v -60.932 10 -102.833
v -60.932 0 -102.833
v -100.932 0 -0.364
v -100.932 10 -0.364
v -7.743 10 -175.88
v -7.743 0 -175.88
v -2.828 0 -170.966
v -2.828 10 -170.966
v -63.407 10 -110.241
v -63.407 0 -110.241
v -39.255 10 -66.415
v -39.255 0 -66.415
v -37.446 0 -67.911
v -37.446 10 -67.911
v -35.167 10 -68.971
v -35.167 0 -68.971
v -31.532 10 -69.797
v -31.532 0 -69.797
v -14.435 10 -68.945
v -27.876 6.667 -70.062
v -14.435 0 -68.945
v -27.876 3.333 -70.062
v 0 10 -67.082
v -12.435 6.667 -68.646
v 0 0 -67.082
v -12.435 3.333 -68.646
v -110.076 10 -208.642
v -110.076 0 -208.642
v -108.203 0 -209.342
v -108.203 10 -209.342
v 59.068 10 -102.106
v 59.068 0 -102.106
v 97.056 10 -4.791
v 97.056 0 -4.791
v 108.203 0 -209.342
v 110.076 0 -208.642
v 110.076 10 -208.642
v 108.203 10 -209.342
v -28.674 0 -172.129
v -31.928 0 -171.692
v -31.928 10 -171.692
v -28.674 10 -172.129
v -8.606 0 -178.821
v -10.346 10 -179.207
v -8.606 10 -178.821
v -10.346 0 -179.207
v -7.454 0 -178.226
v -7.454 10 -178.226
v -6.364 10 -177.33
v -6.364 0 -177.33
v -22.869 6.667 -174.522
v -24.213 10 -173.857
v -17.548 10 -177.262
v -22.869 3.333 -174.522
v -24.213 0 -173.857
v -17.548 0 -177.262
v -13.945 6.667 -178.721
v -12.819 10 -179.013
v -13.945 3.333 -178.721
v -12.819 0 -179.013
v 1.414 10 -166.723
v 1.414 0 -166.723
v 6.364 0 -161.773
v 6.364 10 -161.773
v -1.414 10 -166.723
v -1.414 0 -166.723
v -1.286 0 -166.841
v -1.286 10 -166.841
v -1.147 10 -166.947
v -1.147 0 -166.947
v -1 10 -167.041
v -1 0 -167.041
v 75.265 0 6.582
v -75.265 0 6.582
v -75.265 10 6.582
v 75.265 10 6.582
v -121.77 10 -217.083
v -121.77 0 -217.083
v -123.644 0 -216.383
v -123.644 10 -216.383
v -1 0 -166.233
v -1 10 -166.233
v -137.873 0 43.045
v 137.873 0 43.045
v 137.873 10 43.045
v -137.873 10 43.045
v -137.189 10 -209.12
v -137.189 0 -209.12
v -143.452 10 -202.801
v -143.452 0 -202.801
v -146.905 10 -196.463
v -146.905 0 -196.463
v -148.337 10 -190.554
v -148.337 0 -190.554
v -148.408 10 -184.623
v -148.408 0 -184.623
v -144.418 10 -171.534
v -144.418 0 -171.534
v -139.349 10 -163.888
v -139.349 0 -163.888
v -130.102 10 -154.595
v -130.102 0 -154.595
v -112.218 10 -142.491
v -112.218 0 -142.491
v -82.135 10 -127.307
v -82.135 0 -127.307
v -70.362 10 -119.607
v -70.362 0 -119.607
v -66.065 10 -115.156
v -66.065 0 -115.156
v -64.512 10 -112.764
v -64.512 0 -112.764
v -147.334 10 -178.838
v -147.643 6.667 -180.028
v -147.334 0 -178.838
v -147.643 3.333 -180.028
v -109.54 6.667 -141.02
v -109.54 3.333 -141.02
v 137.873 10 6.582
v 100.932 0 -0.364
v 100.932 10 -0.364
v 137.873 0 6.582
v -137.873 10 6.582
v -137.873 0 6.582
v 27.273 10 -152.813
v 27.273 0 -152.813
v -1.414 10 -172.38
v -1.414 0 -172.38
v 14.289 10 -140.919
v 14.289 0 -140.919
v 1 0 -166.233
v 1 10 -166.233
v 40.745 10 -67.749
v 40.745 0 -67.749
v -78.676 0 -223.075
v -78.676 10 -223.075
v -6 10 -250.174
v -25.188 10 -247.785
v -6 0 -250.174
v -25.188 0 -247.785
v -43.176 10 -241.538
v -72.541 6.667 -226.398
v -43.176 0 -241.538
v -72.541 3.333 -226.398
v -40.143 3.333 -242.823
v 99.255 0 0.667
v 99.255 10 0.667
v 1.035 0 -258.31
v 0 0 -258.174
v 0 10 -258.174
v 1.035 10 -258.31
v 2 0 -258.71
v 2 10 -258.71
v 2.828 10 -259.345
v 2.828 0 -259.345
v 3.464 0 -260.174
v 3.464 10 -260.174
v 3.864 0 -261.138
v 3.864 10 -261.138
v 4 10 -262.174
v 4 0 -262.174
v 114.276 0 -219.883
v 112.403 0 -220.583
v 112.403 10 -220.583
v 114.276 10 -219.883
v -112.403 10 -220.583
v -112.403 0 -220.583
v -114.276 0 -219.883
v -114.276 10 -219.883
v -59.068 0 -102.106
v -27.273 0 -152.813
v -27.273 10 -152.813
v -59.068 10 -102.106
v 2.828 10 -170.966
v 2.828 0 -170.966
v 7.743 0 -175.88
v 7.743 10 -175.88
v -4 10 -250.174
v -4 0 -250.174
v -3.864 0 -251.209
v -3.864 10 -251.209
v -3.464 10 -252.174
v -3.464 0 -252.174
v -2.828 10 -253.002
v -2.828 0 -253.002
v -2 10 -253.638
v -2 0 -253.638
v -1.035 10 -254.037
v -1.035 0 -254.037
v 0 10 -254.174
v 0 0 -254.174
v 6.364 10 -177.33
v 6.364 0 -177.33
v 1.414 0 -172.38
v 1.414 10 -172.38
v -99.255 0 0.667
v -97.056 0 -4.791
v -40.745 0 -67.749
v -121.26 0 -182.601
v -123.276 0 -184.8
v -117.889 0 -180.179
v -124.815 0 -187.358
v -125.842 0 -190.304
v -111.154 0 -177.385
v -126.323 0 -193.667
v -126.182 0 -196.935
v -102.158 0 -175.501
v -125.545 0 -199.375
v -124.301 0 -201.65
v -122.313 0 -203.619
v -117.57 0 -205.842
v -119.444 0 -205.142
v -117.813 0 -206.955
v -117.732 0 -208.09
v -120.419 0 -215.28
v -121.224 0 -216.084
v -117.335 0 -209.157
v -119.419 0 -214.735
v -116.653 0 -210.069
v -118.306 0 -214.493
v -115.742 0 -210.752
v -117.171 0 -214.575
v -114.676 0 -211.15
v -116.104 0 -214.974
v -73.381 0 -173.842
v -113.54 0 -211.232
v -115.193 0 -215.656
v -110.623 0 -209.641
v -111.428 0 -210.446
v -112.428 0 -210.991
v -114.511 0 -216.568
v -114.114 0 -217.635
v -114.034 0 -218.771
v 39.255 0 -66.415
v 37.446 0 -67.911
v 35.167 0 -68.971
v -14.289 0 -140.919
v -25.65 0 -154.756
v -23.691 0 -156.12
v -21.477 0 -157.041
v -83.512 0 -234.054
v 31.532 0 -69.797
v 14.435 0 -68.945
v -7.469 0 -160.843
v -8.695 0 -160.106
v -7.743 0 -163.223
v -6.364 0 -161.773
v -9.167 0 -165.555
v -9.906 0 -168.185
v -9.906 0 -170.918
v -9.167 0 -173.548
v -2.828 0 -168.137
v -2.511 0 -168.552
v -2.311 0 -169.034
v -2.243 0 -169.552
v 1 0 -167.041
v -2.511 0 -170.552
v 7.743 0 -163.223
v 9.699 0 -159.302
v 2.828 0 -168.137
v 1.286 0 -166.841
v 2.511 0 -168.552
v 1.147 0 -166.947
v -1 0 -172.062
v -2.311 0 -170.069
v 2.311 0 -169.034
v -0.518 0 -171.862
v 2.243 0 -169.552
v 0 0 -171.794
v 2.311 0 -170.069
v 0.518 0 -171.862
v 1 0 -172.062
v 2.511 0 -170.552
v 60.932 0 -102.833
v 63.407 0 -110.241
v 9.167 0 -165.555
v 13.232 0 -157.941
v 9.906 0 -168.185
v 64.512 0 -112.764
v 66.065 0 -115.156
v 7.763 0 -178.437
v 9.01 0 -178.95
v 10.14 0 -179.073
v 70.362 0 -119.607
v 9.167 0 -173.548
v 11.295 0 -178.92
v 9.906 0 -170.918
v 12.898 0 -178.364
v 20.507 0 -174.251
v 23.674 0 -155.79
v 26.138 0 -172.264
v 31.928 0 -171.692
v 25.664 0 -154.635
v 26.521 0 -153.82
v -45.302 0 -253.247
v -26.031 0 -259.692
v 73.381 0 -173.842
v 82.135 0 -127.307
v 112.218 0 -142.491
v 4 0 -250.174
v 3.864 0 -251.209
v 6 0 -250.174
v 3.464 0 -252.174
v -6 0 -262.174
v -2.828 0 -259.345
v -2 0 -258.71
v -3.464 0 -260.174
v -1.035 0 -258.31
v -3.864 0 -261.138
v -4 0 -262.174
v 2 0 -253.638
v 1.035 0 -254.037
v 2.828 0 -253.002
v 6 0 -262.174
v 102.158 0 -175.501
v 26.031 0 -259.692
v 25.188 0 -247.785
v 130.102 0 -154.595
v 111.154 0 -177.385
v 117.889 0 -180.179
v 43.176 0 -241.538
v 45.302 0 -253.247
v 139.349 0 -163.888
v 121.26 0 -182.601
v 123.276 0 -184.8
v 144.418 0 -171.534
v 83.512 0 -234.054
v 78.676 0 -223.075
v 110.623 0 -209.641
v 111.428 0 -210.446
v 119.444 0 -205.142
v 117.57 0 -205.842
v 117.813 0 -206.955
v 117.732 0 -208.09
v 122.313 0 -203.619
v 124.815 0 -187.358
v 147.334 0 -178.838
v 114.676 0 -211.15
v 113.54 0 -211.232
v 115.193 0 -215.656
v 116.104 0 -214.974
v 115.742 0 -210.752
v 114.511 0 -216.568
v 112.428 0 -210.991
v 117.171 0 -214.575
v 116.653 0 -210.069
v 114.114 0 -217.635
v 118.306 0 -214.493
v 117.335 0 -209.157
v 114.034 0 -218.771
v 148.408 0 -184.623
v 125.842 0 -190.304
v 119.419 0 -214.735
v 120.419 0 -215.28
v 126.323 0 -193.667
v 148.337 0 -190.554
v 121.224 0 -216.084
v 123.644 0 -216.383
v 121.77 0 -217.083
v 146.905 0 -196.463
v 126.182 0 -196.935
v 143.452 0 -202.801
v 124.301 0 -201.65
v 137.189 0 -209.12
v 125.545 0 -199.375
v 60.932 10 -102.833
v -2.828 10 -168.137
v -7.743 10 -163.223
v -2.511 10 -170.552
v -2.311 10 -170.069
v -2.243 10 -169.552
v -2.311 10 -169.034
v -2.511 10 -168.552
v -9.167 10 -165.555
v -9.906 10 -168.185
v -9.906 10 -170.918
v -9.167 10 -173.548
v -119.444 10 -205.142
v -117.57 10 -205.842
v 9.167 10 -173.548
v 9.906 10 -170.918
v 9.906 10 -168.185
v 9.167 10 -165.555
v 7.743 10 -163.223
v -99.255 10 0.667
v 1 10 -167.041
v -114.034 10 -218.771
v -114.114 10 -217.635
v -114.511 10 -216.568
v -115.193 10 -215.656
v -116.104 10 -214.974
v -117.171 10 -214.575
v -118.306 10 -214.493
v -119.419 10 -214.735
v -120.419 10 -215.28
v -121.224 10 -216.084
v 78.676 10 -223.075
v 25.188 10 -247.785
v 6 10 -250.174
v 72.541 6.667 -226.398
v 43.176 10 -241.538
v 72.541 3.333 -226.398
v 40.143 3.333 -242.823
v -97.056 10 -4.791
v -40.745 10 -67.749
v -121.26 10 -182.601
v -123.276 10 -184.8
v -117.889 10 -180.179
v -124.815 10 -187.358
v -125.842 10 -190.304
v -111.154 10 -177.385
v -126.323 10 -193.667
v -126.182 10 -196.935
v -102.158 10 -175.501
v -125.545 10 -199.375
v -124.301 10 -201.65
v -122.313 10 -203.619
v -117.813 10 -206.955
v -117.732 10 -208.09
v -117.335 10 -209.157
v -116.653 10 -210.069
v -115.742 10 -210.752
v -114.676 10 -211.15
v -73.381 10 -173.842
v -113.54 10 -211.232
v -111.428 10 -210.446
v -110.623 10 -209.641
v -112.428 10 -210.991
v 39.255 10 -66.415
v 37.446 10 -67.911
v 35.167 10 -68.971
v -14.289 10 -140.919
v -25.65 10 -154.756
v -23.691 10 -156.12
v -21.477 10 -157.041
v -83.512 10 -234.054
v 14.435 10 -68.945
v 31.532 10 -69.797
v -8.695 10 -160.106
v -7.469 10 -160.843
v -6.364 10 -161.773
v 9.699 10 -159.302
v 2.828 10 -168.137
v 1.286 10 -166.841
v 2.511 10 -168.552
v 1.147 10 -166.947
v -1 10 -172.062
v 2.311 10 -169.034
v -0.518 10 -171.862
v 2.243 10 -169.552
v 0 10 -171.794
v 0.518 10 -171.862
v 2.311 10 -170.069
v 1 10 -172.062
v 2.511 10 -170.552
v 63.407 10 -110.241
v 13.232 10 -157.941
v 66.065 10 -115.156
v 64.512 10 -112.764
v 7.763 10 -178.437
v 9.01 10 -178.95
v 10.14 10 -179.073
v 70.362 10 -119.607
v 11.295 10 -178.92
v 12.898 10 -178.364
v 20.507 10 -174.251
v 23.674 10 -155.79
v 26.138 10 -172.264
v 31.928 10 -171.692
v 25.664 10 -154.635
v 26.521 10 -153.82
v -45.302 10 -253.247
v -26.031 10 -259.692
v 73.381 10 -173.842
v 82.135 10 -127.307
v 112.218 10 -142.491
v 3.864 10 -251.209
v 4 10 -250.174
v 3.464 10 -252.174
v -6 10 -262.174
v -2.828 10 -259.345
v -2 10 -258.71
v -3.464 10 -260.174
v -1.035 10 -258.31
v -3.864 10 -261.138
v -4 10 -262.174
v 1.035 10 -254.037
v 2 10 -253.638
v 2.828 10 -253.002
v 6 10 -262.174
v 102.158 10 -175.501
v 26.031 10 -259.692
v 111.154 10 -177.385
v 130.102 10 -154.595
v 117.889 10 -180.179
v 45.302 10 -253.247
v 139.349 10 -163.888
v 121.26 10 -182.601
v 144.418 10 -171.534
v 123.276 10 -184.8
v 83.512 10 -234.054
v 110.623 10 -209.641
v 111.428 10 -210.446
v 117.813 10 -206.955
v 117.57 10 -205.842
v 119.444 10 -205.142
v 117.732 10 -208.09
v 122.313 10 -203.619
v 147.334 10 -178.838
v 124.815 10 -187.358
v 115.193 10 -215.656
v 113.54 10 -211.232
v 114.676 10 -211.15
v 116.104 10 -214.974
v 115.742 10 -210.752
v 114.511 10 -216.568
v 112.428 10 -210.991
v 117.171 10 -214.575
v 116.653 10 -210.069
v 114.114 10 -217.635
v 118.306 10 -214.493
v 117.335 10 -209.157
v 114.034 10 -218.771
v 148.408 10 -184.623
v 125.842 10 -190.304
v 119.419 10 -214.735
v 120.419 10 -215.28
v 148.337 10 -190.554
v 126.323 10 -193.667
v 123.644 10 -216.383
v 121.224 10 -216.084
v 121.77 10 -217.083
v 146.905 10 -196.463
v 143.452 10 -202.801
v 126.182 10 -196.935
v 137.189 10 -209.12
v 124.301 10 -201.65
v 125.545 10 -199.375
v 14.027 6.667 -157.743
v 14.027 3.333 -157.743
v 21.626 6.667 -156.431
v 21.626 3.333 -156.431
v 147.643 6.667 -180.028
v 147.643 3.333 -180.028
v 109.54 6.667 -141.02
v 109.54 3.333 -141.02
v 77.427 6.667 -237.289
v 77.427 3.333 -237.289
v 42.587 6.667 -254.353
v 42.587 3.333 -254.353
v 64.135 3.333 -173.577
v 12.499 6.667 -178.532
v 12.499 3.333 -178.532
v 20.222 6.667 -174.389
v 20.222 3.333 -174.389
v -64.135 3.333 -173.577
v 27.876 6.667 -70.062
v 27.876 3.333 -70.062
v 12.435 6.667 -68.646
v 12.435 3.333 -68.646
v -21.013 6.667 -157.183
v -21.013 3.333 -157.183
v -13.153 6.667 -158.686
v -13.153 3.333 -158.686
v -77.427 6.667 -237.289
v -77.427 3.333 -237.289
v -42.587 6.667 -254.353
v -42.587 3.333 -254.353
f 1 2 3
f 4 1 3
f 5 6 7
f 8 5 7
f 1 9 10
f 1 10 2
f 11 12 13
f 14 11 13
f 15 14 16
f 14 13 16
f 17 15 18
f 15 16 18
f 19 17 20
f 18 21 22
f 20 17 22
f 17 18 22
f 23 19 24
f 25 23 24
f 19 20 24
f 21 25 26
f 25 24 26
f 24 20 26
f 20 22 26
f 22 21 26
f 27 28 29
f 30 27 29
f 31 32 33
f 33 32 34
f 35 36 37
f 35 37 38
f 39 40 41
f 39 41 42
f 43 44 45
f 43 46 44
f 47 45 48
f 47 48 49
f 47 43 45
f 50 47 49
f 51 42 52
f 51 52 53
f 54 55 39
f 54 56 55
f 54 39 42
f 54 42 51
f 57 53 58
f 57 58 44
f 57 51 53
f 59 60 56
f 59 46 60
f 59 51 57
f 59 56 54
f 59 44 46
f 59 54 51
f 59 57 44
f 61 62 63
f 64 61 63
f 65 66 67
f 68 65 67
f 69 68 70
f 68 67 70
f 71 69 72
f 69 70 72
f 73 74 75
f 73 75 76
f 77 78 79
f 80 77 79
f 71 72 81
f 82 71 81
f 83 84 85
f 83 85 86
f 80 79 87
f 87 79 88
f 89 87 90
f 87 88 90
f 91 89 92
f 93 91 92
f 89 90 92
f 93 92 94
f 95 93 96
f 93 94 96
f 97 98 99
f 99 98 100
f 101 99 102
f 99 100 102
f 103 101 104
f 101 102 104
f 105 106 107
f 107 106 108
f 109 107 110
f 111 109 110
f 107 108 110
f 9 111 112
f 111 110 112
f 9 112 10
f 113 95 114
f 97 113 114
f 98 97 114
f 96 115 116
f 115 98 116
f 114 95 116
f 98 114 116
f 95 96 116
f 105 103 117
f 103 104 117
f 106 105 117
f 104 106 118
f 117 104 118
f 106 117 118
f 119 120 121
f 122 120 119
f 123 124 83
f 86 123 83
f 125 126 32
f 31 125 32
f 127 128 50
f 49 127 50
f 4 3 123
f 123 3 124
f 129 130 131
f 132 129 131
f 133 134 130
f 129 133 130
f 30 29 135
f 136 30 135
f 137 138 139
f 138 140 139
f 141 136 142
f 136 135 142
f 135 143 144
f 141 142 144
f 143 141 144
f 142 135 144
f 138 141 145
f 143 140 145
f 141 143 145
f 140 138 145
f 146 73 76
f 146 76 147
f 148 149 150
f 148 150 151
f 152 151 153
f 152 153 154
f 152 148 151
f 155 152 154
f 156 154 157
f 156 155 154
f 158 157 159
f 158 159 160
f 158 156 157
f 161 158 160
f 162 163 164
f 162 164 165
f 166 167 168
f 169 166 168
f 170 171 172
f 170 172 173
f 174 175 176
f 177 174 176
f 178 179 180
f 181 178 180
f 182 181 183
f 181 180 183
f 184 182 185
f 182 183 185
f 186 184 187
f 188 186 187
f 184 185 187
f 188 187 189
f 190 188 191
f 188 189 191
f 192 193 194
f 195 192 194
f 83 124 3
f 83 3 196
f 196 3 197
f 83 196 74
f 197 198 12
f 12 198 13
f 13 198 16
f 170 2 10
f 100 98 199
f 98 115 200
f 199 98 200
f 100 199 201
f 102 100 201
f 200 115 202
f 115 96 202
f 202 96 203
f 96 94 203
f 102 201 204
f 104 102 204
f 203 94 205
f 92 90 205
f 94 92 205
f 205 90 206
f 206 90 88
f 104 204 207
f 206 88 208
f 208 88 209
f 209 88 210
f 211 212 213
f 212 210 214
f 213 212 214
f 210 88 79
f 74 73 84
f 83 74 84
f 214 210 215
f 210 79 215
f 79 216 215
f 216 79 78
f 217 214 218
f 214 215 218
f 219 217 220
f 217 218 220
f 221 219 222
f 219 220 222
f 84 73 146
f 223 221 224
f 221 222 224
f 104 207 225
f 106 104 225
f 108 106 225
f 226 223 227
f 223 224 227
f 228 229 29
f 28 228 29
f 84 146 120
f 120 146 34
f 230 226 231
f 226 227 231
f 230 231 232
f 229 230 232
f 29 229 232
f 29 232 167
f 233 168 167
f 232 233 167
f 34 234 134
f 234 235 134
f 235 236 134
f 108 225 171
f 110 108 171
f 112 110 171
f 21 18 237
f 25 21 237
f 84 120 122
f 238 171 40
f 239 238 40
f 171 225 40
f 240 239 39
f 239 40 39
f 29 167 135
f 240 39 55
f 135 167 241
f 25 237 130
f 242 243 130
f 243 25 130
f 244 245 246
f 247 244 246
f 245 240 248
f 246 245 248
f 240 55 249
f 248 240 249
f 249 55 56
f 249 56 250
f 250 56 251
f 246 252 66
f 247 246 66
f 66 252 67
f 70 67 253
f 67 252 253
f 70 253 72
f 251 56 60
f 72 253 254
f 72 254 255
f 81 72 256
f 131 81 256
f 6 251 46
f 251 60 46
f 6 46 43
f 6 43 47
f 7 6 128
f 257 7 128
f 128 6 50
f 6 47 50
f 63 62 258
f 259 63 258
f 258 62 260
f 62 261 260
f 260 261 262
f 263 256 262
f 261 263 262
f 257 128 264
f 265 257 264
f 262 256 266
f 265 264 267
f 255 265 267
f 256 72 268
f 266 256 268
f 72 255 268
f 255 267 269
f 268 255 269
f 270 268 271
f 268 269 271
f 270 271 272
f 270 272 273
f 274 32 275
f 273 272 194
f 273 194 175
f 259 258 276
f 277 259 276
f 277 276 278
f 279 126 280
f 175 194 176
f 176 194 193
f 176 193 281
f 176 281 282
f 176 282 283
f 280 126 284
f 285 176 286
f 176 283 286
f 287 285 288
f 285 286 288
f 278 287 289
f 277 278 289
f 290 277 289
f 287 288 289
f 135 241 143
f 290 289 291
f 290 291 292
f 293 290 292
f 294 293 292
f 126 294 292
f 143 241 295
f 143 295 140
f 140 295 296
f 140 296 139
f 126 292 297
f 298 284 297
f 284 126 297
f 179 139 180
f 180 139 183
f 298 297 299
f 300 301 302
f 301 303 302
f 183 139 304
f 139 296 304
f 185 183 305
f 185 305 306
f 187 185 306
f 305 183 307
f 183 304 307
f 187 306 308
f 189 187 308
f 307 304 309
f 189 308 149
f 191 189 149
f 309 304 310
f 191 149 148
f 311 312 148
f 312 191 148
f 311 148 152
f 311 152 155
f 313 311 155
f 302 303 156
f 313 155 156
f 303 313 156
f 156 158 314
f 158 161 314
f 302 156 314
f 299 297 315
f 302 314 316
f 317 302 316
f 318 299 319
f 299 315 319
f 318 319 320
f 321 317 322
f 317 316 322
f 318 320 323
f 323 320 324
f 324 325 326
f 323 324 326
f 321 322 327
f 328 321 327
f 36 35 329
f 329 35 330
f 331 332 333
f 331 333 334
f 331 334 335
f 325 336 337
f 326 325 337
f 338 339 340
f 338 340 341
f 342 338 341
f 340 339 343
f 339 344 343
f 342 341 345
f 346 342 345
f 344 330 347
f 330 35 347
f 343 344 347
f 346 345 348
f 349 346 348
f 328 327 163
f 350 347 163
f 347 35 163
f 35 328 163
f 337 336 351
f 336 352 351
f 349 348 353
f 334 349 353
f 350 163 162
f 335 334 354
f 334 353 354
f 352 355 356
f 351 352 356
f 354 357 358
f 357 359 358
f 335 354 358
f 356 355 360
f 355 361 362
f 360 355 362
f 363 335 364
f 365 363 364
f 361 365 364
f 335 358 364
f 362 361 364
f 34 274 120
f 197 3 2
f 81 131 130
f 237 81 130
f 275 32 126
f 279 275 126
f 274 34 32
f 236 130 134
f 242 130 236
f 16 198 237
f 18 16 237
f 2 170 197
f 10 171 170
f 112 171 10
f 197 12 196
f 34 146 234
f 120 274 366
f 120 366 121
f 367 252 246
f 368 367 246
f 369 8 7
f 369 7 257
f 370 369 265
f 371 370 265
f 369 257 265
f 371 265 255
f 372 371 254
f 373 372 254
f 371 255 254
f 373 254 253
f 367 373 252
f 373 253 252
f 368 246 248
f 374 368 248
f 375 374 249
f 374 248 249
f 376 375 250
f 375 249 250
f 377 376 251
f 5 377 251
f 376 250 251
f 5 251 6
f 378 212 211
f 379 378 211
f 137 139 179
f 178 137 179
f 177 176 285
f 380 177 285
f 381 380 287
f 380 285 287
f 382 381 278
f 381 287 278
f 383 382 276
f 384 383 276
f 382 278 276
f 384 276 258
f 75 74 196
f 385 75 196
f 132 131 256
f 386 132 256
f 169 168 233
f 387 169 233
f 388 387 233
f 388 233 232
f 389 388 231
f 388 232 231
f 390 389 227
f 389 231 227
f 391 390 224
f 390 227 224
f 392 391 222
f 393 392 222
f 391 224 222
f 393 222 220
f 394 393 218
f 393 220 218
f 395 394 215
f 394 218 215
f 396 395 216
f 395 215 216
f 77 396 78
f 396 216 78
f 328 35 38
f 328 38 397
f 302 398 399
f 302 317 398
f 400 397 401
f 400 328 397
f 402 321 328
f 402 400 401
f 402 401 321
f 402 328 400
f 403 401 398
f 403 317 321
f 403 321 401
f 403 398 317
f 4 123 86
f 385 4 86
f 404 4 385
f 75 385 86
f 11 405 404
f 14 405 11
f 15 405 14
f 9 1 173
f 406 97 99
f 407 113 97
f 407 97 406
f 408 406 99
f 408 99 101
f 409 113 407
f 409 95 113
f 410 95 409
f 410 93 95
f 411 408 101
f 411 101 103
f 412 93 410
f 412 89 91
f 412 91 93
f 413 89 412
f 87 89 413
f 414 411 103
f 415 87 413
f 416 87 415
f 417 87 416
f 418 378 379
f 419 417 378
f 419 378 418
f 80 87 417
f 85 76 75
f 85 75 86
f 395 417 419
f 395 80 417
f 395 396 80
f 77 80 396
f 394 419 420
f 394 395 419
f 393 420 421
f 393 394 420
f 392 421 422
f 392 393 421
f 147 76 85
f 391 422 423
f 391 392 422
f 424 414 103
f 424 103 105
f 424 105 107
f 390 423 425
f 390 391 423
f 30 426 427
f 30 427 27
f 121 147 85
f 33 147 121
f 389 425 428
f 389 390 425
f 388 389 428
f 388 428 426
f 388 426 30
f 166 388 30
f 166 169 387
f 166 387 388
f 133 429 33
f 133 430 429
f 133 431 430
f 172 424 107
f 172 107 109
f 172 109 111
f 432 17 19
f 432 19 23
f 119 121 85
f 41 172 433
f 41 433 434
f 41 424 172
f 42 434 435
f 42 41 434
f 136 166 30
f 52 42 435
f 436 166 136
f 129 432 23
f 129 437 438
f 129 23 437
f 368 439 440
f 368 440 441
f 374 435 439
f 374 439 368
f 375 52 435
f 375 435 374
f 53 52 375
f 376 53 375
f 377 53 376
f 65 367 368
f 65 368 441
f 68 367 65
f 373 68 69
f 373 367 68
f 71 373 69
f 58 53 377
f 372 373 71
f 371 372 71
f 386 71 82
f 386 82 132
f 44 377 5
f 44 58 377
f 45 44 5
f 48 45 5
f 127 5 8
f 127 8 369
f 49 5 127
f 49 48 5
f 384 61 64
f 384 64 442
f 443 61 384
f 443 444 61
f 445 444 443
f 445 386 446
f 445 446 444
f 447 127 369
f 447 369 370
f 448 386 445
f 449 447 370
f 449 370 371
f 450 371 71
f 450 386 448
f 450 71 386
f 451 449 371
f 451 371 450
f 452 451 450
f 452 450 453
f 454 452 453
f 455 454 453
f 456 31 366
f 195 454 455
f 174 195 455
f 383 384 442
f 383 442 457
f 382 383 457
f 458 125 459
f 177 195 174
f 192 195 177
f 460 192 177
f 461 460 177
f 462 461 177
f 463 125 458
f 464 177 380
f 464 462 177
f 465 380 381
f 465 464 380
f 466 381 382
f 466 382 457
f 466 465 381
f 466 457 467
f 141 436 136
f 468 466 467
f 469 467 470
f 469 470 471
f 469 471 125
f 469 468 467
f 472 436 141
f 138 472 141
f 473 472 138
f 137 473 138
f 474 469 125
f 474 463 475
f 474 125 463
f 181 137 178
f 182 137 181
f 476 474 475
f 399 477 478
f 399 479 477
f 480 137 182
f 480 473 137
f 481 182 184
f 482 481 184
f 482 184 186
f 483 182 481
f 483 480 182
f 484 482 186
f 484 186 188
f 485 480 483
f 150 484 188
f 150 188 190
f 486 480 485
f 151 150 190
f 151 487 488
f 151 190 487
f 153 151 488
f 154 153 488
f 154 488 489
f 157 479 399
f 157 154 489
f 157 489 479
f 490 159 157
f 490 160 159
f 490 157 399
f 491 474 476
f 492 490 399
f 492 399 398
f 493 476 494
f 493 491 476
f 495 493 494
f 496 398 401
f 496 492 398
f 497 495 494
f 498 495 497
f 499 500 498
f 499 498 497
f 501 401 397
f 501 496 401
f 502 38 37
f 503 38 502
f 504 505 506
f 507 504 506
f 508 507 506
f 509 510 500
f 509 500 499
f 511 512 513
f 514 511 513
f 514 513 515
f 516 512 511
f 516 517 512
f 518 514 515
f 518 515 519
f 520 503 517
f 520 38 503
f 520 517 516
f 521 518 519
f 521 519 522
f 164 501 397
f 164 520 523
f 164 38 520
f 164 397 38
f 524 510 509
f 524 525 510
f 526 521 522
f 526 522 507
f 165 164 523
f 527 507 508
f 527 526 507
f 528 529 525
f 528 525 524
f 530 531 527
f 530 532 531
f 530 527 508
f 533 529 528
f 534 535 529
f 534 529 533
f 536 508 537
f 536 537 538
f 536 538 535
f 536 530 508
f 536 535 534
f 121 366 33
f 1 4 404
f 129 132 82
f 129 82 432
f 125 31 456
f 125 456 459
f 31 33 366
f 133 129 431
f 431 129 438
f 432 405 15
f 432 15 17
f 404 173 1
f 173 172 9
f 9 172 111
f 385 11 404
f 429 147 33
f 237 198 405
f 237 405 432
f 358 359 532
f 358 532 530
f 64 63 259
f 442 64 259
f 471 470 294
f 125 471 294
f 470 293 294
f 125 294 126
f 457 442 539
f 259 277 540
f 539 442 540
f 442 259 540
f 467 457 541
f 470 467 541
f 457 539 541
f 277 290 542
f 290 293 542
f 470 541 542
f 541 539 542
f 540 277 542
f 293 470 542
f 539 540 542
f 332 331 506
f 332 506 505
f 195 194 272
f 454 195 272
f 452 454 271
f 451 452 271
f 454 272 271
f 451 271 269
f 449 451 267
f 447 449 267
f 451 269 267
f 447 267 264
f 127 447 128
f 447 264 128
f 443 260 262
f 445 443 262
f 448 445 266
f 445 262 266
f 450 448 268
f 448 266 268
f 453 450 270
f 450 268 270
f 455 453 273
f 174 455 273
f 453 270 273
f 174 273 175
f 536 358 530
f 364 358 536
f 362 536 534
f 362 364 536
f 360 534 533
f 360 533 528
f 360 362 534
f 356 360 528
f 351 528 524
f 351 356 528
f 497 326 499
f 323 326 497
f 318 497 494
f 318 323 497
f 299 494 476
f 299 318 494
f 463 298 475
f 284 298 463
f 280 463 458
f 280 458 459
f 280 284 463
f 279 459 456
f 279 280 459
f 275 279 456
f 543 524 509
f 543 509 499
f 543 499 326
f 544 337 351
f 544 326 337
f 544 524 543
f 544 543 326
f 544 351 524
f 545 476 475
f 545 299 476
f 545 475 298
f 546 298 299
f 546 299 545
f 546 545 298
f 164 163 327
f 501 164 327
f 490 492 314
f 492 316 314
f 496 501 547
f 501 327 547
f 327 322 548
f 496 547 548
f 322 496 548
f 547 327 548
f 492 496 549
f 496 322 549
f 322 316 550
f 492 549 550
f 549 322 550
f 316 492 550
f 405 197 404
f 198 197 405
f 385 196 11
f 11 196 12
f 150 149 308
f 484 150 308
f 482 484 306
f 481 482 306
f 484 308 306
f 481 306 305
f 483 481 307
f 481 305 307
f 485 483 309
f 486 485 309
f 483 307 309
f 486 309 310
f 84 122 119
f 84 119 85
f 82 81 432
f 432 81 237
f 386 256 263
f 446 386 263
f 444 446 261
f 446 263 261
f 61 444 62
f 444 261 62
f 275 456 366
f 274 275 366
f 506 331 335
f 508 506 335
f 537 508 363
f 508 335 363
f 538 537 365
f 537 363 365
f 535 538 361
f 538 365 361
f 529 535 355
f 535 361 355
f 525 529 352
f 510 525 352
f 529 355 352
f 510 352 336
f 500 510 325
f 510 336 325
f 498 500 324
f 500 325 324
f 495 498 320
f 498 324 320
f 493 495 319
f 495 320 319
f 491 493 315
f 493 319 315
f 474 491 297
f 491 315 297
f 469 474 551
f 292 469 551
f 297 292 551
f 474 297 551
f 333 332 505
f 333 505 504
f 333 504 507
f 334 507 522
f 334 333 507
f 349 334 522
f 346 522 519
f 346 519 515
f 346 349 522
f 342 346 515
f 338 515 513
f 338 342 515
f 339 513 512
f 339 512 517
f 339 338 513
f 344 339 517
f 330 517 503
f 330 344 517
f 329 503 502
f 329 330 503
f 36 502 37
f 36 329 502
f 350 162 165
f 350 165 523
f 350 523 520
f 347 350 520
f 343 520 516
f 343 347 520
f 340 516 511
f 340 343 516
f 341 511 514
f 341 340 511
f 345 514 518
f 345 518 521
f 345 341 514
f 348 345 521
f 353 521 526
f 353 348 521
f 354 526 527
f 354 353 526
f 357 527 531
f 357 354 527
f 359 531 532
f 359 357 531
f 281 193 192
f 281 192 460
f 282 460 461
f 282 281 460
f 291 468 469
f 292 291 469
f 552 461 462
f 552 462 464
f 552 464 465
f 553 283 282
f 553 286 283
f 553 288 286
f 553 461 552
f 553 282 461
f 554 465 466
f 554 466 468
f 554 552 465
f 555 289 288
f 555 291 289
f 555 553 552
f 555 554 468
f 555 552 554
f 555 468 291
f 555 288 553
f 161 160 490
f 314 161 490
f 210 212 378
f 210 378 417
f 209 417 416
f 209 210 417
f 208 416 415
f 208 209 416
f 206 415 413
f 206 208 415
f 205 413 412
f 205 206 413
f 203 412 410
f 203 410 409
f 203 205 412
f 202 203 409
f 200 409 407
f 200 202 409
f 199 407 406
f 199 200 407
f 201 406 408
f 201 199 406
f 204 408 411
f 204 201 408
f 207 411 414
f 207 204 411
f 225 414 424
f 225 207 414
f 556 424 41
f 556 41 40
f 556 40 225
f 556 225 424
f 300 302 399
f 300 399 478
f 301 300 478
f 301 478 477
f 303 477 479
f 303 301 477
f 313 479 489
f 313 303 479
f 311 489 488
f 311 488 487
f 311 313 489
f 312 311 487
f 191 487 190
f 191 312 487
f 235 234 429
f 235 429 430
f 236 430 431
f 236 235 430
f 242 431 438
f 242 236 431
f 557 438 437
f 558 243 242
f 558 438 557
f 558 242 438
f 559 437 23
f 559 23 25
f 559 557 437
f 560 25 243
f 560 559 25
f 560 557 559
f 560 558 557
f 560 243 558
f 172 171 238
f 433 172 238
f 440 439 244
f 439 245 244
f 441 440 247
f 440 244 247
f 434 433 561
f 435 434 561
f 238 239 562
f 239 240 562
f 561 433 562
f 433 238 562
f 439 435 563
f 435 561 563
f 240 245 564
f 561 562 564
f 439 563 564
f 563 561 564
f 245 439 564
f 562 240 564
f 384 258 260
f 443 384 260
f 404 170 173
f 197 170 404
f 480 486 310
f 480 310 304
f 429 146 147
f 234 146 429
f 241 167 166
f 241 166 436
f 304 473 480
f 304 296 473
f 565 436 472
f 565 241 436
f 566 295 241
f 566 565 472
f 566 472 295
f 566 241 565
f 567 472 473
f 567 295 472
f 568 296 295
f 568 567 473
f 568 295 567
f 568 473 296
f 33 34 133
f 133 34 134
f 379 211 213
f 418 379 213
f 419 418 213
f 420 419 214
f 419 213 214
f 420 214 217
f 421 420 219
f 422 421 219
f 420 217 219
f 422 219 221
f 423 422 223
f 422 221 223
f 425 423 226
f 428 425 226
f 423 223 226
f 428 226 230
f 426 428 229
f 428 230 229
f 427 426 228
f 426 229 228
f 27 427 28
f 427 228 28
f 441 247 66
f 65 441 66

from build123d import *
from build123d.topology import SkipClean

# Parameters (mm, degrees)
BOSS_EXTRUDE1_DEPTH = 10
CUT_EXTRUDE1_START  = -10
SKETCH6_R           = 32
CUT_EXTRUDE1_DEPTH  = 10
BOSS_EXTRUDE3_START = -10
BOSS_EXTRUDE3_DEPTH = 10


with BuildPart() as part:
    # Sketch4 → Boss-Extrude1 (new body)
    with BuildSketch(Plane(origin=(0, 0, 0), x_dir=(1, 0, 0), z_dir=(0, 1, 0))):
        with BuildLine():
            Line((-60.931540979, 102.833144023), (-100.931540979, 0.363636364))
            Line((-100.931540979, 0.363636364), (-137.873440008, -6.581863165))
            Line((-137.873440008, -6.581863165), (-137.873440008, -43.045016767))
            Line((-137.873440008, -43.045016767), (0, -43.045016767))
            Line((0, -43.045016767), (0, -6.581863165))
            Line((0, -6.581863165), (-75.265123248, -6.581863165))
            Line((-75.265123248, -6.581863165), (-99.254644008, -0.666666667))
            Line((-99.254644008, -0.666666667), (-39.254644008, 66.415372658))
            add(Edge.make_bspline(
                [(-39.254644008, 66.415372658), (-32.263304985, 74.231927312), (-8.576970769, 67.082039325), (0, 67.082039325)],
                knots=[0, 0, 0, 0, 1, 1, 1, 1], degree=3))
            Line((0, 67.082039325), (0, 185.898359068))
            add(Edge.make_bspline(
                [(-8.949396824, 172.714099063), (-10.970561894, 176.563352288), (-7.616484748, 181.238960263), (-4.813614966, 185.898359068), (0, 185.898359068)],
                knots=[0, 0, 0, 0, 0.470592774, 1, 1, 1, 1], degree=3))
            ThreePointArc((-8.949396824, 172.714099063), (-8.984162865, 171.72340098), (-9.854808922, 171.249410672))
            Line((-9.854808922, 171.249410672), (-31.928338207, 171.691925306))
            add(Edge.make_bspline(
                [(-119.4438851, 205.142202368), (-125.671665833, 202.815386996), (-131.195665925, 172.228367493), (-78.301604385, 175.640544072), (-35.271953311, 171.758955756), (-31.928338207, 171.691925306)],
                knots=[0, 0, 0, 0, 0.124419451, 0.710010278, 1, 1, 1, 1], degree=3))
            Line((-119.4438851, 205.142202368), (-117.570377314, 205.842179921))
            ThreePointArc((-117.570377314, 205.842179921), (-115.223316728, 210.98915028), (-110.076346168, 208.642090132))
            Line((-110.076346168, 208.642090132), (-108.202838382, 209.342067685))
            add(Edge.make_bspline(
                [(-108.202838382, 209.342067685), (-69.239563588, 223.899475954), (-42.68582532, 250.173769149), (-6, 250.173769149)],
                knots=[0, 0, 0, 0, 1, 1, 1, 1], degree=3))
            Line((-6, 250.173769149), (-4, 250.173769149))
            ThreePointArc((-4, 250.173769149), (-2.828427125, 253.002196274), (0, 254.173769149))
            Line((0, 254.173769149), (0, 258.173769149))
            ThreePointArc((0, 258.173769149), (-2.828427125, 259.345342024), (-4, 262.173769149))
            Line((-4, 262.173769149), (-6, 262.173769149))
            add(Edge.make_bspline(
                [(-112.402703461, 220.583113766), (-76.730376789, 233.910962259), (-44.089424314, 262.173769149), (-6, 262.173769149)],
                knots=[0, 0, 0, 0, 1, 1, 1, 1], degree=3))
            Line((-112.402703461, 220.583113766), (-114.276211247, 219.883136213))
            ThreePointArc((-114.276211247, 219.883136213), (-116.623271833, 214.736165853), (-121.770242393, 217.083226002))
            Line((-121.770242393, 217.083226002), (-123.643750179, 216.383248449))
            add(Edge.make_bspline(
                [(-123.643750179, 216.383248449), (-146.450625439, 207.86217325), (-156.092404914, 174.1495844), (-112.677809008, 138.120350468), (-67.746919643, 123.223591214), (-63.407426979, 110.240571436)],
                knots=[0, 0, 0, 0, 0.283698631, 0.638823971, 1, 1, 1, 1], degree=3))
            Line((-63.407426979, 110.240571436), (-60.931540979, 102.833144023))
        make_face()
        with BuildLine():
            Line((-59.068459021, 102.105871296), (-97.056182656, 4.791287847))
            Line((-97.056182656, 4.791287847), (-40.745355992, 67.748705992))
            Line((-40.745355992, 67.748705992), (-6.453280422, 162.591043343))
            ThreePointArc((-6.453280422, 162.591043343), (-6.944626107, 163.452014183), (-7.935821997, 163.466916409))
            Line((-7.935821997, 163.466916409), (-27.273316425, 152.813380681))
            Line((-27.273316425, 152.813380681), (-59.068459021, 102.105871296))
        make_face(mode=Mode.SUBTRACT)
        with BuildLine():
            Line((-8.989046189, 165.170103317), (-28.265787332, 154.550038176))
            ThreePointArc((-28.265787332, 154.550038176), (-31.069419685, 161.890531357), (-31.999687563, 169.692953814))
            Line((-31.999687563, 169.692953814), (-9.995507461, 169.251829444))
            ThreePointArc((-9.995507461, 169.251829444), (-9.709193652, 167.157479601), (-8.989046189, 165.170103317))
        make_face(mode=Mode.SUBTRACT)
    extrude(amount=BOSS_EXTRUDE1_DEPTH)

    # Mirror1: part across plane


with BuildPart() as part_1:
    add(part.part)
    add(part.part.mirror(Plane(origin=(0, 10, 0), x_dir=(0, 0, 1), z_dir=(1, 0, 0))))

    # Sketch6 → Cut-Extrude1 (cut)
    with SkipClean():  # the faces are left unmerged after this step: merging them gives an invalid solid
        with BuildSketch(Plane(origin=(0, 10, 0), x_dir=(1, 0, 0), z_dir=(0, 1, 0)).offset(CUT_EXTRUDE1_START)):
            with Locations((0, 169.551546985)):
                Circle(SKETCH6_R)
        extrude(amount=CUT_EXTRUDE1_DEPTH, mode=Mode.SUBTRACT)

    # Sketch7 → Boss-Extrude3 (add)
    with BuildSketch(Plane(origin=(0, 10, 0), x_dir=(1, 0, 0), z_dir=(0, 1, 0)).offset(BOSS_EXTRUDE3_START)):
        with BuildLine():
            Line((14.289200309, 140.919069716), (1, 166.232519779))
            Line((1, 166.232519779), (1, 167.040957105))
            ThreePointArc((1, 167.040957105), (1.217522858, 166.895612978), (1.414213562, 166.72311986))
            Line((1.414213562, 166.72311986), (6.363961031, 161.773372392))
            add(Edge.make_bspline(
                [(6.363961031, 161.773372392), (13.42797039, 154.709363033), (23.232750867, 159.257352912), (27.273316425, 152.813380681)],
                knots=[0, 0, 0, 0, 1, 1, 1, 1], degree=3))
            ThreePointArc((27.273316425, 152.813380681), (31.069419685, 161.890531357), (31.928338207, 171.691925306))
            add(Edge.make_bspline(
                [(6.363961031, 177.329721578), (12.503350482, 183.469111029), (17.431423379, 171.401301325), (31.928338207, 171.691925306)],
                knots=[0, 0, 0, 0, 1, 1, 1, 1], degree=3))
            Line((6.363961031, 177.329721578), (1.414213562, 172.379974109))
            ThreePointArc((1.414213562, 172.379974109), (0, 171.794187672), (-1.414213562, 172.379974109))
            Line((-1.414213562, 172.379974109), (-6.363961031, 177.329721578))
            add(Edge.make_bspline(
                [(-31.928338207, 171.691925306), (-23.203871901, 171.517023324), (-12.870439893, 183.83620044), (-6.363961031, 177.329721578)],
                knots=[0, 0, 0, 0, 1, 1, 1, 1], degree=3))
            ThreePointArc((-31.928338207, 171.691925306), (-31.069419685, 161.890531357), (-27.273316425, 152.813380681))
            add(Edge.make_bspline(
                [(-27.273316425, 152.813380681), (-22.704943746, 160.099109933), (-11.725773506, 156.411559916), (-6.363961031, 161.773372392)],
                knots=[0, 0, 0, 0, 1, 1, 1, 1], degree=3))
            Line((-6.363961031, 161.773372392), (-1.414213562, 166.72311986))
            ThreePointArc((-1.414213562, 166.72311986), (-1.217522858, 166.895612978), (-1, 167.040957105))
            Line((-1, 167.040957105), (-1, 166.232519779))
            Line((-1, 166.232519779), (-14.289200309, 140.919069716))
            ThreePointArc((-14.289200309, 140.919069716), (0, 137.551546985), (14.289200309, 140.919069716))
        make_face()
        with BuildLine():
            ThreePointArc((-7.742730421, 163.223030126), (-10, 169.551546985), (-7.742730421, 175.880063843))
            Line((-7.742730421, 175.880063843), (-2.828427125, 170.965760547))
            ThreePointArc((-2.828427125, 170.965760547), (-2.242640687, 169.551546985), (-2.828427125, 168.137333422))
            Line((-2.828427125, 168.137333422), (-7.742730421, 163.223030126))
        make_face(mode=Mode.SUBTRACT)
        with BuildLine():
            Line((2.828427125, 170.965760547), (7.742730421, 175.880063843))
            ThreePointArc((7.742730421, 175.880063843), (10, 169.551546985), (7.742730421, 163.223030126))
            Line((7.742730421, 163.223030126), (2.828427125, 168.137333422))
            ThreePointArc((2.828427125, 168.137333422), (2.242640687, 169.551546985), (2.828427125, 170.965760547))
        make_face(mode=Mode.SUBTRACT)
    extrude(amount=BOSS_EXTRUDE3_DEPTH)


solid = part_1.part
